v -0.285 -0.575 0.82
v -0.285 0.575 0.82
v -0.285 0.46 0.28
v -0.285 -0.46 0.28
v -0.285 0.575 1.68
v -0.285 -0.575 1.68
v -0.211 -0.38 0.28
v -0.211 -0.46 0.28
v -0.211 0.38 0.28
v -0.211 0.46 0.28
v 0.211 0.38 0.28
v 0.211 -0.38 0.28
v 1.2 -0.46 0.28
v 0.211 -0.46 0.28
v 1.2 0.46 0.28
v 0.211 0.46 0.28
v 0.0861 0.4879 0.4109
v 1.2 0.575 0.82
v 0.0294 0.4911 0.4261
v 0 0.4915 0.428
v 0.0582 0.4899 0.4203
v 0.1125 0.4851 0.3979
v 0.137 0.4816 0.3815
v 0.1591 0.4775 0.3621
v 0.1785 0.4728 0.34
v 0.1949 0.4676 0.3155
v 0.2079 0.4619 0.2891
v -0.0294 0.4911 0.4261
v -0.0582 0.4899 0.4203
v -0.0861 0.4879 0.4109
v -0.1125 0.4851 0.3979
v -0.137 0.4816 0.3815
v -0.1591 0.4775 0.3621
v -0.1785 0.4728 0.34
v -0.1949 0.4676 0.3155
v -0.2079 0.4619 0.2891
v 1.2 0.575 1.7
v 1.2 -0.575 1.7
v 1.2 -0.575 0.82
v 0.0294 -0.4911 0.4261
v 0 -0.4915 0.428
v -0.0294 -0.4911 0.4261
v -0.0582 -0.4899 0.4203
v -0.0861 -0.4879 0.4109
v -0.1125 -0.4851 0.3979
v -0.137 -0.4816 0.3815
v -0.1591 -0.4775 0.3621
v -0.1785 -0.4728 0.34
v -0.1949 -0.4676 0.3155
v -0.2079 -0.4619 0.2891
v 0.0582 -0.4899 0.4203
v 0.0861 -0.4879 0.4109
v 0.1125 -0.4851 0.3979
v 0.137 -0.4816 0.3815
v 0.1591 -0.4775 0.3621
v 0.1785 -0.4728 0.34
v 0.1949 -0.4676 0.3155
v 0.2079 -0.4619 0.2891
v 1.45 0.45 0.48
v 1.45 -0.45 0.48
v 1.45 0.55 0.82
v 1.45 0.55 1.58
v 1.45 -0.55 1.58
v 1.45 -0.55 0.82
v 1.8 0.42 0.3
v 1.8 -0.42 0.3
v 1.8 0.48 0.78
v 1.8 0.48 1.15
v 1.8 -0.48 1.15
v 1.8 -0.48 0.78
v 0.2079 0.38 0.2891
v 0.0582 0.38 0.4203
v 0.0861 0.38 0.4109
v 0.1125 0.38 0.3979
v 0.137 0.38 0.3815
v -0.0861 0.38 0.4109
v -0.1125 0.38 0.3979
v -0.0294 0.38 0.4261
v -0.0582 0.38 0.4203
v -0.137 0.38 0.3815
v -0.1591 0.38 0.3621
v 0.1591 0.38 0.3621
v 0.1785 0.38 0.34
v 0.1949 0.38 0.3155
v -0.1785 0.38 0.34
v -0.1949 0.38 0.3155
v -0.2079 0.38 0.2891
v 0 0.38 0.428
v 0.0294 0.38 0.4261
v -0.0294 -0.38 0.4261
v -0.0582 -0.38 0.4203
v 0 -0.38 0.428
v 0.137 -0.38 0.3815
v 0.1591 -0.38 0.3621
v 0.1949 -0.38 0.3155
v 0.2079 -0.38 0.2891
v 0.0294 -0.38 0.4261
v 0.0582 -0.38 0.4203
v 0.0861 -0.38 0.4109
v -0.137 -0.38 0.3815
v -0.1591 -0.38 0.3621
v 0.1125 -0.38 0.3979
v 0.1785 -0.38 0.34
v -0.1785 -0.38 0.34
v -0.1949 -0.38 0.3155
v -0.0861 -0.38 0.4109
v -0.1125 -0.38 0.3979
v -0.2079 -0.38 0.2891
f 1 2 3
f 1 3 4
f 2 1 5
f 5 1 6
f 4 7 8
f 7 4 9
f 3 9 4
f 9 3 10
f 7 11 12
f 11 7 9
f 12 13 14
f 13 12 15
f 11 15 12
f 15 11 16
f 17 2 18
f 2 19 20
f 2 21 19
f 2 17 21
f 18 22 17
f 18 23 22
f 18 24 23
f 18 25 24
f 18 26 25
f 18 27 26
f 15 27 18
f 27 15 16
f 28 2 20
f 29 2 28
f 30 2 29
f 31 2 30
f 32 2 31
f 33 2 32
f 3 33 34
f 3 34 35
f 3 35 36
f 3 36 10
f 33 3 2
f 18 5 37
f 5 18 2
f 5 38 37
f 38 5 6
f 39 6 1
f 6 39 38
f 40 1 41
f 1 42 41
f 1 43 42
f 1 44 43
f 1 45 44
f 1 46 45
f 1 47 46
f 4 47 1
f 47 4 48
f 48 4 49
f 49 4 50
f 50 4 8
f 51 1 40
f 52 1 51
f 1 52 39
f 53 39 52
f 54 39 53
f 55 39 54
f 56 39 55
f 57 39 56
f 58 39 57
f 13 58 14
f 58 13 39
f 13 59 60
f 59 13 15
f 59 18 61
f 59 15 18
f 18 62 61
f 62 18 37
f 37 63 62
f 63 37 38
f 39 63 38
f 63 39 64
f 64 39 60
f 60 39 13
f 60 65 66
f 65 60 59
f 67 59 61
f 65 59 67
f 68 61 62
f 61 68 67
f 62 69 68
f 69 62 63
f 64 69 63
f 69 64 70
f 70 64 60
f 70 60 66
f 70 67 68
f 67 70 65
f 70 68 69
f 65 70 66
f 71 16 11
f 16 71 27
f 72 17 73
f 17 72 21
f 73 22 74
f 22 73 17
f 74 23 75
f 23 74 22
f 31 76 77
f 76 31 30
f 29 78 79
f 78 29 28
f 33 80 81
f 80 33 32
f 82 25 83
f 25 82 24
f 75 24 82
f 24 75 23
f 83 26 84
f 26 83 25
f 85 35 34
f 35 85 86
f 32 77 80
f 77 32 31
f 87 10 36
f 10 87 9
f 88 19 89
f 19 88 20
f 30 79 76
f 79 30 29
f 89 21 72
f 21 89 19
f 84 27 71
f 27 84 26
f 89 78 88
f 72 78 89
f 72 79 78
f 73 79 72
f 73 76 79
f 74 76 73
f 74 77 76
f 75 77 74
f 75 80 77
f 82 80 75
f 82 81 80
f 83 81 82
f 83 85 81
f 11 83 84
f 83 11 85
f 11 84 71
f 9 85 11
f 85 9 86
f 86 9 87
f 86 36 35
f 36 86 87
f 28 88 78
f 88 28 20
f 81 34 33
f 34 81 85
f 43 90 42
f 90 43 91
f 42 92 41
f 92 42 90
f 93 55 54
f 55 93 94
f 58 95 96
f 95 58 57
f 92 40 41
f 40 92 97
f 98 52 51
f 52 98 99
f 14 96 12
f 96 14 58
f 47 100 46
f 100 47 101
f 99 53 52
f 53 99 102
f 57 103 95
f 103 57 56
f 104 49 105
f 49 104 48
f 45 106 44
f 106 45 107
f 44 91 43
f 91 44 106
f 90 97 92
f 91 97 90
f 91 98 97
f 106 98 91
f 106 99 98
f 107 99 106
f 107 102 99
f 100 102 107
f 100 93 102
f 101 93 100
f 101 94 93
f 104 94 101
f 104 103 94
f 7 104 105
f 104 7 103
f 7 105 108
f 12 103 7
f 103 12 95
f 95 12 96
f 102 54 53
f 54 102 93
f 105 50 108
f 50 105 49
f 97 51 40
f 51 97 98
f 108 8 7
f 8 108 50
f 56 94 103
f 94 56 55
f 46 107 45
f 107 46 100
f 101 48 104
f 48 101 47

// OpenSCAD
// Copyright 2026 E-Trike
// Licensed under the Apache License, Version 2.0
//
// Closed Bajaj-style body with circular rear wheel openings.
// Coordinates use ROS convention: +X forward, +Y left, +Z up.

$fn = 48;

module body_envelope() {
  polyhedron(
    points = [
      // Rear cabin station.
      [-0.285, -0.460, 0.280],
      [-0.285,  0.460, 0.280],
      [-0.285,  0.575, 0.820],
      [-0.285,  0.575, 1.680],
      [-0.285, -0.575, 1.680],
      [-0.285, -0.575, 0.820],

      // Front of main cabin.
      [1.200, -0.460, 0.280],
      [1.200,  0.460, 0.280],
      [1.200,  0.575, 0.820],
      [1.200,  0.575, 1.700],
      [1.200, -0.575, 1.700],
      [1.200, -0.575, 0.820],

      // Windshield shoulder.
      [1.450, -0.450, 0.480],
      [1.450,  0.450, 0.480],
      [1.450,  0.550, 0.820],
      [1.450,  0.550, 1.580],
      [1.450, -0.550, 1.580],
      [1.450, -0.550, 0.820],

      // Blunt front apron behind the uncovered front wheel.
      [1.800, -0.420, 0.300],
      [1.800,  0.420, 0.300],
      [1.800,  0.480, 0.780],
      [1.800,  0.480, 1.150],
      [1.800, -0.480, 1.150],
      [1.800, -0.480, 0.780]
    ],
    faces = [
      [5, 4, 3, 2, 1, 0],

      [0, 1, 7, 6],
      [1, 2, 8, 7],
      [2, 3, 9, 8],
      [3, 4, 10, 9],
      [4, 5, 11, 10],
      [5, 0, 6, 11],

      [6, 7, 13, 12],
      [7, 8, 14, 13],
      [8, 9, 15, 14],
      [9, 10, 16, 15],
      [10, 11, 17, 16],
      [11, 6, 12, 17],

      [12, 13, 19, 18],
      [13, 14, 20, 19],
      [14, 15, 21, 20],
      [15, 16, 22, 21],
      [16, 17, 23, 22],
      [17, 12, 18, 23],

      [18, 19, 20, 21, 22, 23]
    ],
    convexity = 10
  );
}

module rear_wheel_opening(side) {
  // A short transverse cutter removes only the outer side wall. The center
  // floor remains solid, while the 0.225 m radius gives each 0.203 m tire a
  // close circular opening without creating a fender or wheel cover.
  translate([0, side * 0.580, 0.203])
    rotate([90, 0, 0])
      cylinder(h = 0.400, r = 0.225, center = true);
}

difference() {
  body_envelope();
  rear_wheel_opening(1);
  rear_wheel_opening(-1);
}
